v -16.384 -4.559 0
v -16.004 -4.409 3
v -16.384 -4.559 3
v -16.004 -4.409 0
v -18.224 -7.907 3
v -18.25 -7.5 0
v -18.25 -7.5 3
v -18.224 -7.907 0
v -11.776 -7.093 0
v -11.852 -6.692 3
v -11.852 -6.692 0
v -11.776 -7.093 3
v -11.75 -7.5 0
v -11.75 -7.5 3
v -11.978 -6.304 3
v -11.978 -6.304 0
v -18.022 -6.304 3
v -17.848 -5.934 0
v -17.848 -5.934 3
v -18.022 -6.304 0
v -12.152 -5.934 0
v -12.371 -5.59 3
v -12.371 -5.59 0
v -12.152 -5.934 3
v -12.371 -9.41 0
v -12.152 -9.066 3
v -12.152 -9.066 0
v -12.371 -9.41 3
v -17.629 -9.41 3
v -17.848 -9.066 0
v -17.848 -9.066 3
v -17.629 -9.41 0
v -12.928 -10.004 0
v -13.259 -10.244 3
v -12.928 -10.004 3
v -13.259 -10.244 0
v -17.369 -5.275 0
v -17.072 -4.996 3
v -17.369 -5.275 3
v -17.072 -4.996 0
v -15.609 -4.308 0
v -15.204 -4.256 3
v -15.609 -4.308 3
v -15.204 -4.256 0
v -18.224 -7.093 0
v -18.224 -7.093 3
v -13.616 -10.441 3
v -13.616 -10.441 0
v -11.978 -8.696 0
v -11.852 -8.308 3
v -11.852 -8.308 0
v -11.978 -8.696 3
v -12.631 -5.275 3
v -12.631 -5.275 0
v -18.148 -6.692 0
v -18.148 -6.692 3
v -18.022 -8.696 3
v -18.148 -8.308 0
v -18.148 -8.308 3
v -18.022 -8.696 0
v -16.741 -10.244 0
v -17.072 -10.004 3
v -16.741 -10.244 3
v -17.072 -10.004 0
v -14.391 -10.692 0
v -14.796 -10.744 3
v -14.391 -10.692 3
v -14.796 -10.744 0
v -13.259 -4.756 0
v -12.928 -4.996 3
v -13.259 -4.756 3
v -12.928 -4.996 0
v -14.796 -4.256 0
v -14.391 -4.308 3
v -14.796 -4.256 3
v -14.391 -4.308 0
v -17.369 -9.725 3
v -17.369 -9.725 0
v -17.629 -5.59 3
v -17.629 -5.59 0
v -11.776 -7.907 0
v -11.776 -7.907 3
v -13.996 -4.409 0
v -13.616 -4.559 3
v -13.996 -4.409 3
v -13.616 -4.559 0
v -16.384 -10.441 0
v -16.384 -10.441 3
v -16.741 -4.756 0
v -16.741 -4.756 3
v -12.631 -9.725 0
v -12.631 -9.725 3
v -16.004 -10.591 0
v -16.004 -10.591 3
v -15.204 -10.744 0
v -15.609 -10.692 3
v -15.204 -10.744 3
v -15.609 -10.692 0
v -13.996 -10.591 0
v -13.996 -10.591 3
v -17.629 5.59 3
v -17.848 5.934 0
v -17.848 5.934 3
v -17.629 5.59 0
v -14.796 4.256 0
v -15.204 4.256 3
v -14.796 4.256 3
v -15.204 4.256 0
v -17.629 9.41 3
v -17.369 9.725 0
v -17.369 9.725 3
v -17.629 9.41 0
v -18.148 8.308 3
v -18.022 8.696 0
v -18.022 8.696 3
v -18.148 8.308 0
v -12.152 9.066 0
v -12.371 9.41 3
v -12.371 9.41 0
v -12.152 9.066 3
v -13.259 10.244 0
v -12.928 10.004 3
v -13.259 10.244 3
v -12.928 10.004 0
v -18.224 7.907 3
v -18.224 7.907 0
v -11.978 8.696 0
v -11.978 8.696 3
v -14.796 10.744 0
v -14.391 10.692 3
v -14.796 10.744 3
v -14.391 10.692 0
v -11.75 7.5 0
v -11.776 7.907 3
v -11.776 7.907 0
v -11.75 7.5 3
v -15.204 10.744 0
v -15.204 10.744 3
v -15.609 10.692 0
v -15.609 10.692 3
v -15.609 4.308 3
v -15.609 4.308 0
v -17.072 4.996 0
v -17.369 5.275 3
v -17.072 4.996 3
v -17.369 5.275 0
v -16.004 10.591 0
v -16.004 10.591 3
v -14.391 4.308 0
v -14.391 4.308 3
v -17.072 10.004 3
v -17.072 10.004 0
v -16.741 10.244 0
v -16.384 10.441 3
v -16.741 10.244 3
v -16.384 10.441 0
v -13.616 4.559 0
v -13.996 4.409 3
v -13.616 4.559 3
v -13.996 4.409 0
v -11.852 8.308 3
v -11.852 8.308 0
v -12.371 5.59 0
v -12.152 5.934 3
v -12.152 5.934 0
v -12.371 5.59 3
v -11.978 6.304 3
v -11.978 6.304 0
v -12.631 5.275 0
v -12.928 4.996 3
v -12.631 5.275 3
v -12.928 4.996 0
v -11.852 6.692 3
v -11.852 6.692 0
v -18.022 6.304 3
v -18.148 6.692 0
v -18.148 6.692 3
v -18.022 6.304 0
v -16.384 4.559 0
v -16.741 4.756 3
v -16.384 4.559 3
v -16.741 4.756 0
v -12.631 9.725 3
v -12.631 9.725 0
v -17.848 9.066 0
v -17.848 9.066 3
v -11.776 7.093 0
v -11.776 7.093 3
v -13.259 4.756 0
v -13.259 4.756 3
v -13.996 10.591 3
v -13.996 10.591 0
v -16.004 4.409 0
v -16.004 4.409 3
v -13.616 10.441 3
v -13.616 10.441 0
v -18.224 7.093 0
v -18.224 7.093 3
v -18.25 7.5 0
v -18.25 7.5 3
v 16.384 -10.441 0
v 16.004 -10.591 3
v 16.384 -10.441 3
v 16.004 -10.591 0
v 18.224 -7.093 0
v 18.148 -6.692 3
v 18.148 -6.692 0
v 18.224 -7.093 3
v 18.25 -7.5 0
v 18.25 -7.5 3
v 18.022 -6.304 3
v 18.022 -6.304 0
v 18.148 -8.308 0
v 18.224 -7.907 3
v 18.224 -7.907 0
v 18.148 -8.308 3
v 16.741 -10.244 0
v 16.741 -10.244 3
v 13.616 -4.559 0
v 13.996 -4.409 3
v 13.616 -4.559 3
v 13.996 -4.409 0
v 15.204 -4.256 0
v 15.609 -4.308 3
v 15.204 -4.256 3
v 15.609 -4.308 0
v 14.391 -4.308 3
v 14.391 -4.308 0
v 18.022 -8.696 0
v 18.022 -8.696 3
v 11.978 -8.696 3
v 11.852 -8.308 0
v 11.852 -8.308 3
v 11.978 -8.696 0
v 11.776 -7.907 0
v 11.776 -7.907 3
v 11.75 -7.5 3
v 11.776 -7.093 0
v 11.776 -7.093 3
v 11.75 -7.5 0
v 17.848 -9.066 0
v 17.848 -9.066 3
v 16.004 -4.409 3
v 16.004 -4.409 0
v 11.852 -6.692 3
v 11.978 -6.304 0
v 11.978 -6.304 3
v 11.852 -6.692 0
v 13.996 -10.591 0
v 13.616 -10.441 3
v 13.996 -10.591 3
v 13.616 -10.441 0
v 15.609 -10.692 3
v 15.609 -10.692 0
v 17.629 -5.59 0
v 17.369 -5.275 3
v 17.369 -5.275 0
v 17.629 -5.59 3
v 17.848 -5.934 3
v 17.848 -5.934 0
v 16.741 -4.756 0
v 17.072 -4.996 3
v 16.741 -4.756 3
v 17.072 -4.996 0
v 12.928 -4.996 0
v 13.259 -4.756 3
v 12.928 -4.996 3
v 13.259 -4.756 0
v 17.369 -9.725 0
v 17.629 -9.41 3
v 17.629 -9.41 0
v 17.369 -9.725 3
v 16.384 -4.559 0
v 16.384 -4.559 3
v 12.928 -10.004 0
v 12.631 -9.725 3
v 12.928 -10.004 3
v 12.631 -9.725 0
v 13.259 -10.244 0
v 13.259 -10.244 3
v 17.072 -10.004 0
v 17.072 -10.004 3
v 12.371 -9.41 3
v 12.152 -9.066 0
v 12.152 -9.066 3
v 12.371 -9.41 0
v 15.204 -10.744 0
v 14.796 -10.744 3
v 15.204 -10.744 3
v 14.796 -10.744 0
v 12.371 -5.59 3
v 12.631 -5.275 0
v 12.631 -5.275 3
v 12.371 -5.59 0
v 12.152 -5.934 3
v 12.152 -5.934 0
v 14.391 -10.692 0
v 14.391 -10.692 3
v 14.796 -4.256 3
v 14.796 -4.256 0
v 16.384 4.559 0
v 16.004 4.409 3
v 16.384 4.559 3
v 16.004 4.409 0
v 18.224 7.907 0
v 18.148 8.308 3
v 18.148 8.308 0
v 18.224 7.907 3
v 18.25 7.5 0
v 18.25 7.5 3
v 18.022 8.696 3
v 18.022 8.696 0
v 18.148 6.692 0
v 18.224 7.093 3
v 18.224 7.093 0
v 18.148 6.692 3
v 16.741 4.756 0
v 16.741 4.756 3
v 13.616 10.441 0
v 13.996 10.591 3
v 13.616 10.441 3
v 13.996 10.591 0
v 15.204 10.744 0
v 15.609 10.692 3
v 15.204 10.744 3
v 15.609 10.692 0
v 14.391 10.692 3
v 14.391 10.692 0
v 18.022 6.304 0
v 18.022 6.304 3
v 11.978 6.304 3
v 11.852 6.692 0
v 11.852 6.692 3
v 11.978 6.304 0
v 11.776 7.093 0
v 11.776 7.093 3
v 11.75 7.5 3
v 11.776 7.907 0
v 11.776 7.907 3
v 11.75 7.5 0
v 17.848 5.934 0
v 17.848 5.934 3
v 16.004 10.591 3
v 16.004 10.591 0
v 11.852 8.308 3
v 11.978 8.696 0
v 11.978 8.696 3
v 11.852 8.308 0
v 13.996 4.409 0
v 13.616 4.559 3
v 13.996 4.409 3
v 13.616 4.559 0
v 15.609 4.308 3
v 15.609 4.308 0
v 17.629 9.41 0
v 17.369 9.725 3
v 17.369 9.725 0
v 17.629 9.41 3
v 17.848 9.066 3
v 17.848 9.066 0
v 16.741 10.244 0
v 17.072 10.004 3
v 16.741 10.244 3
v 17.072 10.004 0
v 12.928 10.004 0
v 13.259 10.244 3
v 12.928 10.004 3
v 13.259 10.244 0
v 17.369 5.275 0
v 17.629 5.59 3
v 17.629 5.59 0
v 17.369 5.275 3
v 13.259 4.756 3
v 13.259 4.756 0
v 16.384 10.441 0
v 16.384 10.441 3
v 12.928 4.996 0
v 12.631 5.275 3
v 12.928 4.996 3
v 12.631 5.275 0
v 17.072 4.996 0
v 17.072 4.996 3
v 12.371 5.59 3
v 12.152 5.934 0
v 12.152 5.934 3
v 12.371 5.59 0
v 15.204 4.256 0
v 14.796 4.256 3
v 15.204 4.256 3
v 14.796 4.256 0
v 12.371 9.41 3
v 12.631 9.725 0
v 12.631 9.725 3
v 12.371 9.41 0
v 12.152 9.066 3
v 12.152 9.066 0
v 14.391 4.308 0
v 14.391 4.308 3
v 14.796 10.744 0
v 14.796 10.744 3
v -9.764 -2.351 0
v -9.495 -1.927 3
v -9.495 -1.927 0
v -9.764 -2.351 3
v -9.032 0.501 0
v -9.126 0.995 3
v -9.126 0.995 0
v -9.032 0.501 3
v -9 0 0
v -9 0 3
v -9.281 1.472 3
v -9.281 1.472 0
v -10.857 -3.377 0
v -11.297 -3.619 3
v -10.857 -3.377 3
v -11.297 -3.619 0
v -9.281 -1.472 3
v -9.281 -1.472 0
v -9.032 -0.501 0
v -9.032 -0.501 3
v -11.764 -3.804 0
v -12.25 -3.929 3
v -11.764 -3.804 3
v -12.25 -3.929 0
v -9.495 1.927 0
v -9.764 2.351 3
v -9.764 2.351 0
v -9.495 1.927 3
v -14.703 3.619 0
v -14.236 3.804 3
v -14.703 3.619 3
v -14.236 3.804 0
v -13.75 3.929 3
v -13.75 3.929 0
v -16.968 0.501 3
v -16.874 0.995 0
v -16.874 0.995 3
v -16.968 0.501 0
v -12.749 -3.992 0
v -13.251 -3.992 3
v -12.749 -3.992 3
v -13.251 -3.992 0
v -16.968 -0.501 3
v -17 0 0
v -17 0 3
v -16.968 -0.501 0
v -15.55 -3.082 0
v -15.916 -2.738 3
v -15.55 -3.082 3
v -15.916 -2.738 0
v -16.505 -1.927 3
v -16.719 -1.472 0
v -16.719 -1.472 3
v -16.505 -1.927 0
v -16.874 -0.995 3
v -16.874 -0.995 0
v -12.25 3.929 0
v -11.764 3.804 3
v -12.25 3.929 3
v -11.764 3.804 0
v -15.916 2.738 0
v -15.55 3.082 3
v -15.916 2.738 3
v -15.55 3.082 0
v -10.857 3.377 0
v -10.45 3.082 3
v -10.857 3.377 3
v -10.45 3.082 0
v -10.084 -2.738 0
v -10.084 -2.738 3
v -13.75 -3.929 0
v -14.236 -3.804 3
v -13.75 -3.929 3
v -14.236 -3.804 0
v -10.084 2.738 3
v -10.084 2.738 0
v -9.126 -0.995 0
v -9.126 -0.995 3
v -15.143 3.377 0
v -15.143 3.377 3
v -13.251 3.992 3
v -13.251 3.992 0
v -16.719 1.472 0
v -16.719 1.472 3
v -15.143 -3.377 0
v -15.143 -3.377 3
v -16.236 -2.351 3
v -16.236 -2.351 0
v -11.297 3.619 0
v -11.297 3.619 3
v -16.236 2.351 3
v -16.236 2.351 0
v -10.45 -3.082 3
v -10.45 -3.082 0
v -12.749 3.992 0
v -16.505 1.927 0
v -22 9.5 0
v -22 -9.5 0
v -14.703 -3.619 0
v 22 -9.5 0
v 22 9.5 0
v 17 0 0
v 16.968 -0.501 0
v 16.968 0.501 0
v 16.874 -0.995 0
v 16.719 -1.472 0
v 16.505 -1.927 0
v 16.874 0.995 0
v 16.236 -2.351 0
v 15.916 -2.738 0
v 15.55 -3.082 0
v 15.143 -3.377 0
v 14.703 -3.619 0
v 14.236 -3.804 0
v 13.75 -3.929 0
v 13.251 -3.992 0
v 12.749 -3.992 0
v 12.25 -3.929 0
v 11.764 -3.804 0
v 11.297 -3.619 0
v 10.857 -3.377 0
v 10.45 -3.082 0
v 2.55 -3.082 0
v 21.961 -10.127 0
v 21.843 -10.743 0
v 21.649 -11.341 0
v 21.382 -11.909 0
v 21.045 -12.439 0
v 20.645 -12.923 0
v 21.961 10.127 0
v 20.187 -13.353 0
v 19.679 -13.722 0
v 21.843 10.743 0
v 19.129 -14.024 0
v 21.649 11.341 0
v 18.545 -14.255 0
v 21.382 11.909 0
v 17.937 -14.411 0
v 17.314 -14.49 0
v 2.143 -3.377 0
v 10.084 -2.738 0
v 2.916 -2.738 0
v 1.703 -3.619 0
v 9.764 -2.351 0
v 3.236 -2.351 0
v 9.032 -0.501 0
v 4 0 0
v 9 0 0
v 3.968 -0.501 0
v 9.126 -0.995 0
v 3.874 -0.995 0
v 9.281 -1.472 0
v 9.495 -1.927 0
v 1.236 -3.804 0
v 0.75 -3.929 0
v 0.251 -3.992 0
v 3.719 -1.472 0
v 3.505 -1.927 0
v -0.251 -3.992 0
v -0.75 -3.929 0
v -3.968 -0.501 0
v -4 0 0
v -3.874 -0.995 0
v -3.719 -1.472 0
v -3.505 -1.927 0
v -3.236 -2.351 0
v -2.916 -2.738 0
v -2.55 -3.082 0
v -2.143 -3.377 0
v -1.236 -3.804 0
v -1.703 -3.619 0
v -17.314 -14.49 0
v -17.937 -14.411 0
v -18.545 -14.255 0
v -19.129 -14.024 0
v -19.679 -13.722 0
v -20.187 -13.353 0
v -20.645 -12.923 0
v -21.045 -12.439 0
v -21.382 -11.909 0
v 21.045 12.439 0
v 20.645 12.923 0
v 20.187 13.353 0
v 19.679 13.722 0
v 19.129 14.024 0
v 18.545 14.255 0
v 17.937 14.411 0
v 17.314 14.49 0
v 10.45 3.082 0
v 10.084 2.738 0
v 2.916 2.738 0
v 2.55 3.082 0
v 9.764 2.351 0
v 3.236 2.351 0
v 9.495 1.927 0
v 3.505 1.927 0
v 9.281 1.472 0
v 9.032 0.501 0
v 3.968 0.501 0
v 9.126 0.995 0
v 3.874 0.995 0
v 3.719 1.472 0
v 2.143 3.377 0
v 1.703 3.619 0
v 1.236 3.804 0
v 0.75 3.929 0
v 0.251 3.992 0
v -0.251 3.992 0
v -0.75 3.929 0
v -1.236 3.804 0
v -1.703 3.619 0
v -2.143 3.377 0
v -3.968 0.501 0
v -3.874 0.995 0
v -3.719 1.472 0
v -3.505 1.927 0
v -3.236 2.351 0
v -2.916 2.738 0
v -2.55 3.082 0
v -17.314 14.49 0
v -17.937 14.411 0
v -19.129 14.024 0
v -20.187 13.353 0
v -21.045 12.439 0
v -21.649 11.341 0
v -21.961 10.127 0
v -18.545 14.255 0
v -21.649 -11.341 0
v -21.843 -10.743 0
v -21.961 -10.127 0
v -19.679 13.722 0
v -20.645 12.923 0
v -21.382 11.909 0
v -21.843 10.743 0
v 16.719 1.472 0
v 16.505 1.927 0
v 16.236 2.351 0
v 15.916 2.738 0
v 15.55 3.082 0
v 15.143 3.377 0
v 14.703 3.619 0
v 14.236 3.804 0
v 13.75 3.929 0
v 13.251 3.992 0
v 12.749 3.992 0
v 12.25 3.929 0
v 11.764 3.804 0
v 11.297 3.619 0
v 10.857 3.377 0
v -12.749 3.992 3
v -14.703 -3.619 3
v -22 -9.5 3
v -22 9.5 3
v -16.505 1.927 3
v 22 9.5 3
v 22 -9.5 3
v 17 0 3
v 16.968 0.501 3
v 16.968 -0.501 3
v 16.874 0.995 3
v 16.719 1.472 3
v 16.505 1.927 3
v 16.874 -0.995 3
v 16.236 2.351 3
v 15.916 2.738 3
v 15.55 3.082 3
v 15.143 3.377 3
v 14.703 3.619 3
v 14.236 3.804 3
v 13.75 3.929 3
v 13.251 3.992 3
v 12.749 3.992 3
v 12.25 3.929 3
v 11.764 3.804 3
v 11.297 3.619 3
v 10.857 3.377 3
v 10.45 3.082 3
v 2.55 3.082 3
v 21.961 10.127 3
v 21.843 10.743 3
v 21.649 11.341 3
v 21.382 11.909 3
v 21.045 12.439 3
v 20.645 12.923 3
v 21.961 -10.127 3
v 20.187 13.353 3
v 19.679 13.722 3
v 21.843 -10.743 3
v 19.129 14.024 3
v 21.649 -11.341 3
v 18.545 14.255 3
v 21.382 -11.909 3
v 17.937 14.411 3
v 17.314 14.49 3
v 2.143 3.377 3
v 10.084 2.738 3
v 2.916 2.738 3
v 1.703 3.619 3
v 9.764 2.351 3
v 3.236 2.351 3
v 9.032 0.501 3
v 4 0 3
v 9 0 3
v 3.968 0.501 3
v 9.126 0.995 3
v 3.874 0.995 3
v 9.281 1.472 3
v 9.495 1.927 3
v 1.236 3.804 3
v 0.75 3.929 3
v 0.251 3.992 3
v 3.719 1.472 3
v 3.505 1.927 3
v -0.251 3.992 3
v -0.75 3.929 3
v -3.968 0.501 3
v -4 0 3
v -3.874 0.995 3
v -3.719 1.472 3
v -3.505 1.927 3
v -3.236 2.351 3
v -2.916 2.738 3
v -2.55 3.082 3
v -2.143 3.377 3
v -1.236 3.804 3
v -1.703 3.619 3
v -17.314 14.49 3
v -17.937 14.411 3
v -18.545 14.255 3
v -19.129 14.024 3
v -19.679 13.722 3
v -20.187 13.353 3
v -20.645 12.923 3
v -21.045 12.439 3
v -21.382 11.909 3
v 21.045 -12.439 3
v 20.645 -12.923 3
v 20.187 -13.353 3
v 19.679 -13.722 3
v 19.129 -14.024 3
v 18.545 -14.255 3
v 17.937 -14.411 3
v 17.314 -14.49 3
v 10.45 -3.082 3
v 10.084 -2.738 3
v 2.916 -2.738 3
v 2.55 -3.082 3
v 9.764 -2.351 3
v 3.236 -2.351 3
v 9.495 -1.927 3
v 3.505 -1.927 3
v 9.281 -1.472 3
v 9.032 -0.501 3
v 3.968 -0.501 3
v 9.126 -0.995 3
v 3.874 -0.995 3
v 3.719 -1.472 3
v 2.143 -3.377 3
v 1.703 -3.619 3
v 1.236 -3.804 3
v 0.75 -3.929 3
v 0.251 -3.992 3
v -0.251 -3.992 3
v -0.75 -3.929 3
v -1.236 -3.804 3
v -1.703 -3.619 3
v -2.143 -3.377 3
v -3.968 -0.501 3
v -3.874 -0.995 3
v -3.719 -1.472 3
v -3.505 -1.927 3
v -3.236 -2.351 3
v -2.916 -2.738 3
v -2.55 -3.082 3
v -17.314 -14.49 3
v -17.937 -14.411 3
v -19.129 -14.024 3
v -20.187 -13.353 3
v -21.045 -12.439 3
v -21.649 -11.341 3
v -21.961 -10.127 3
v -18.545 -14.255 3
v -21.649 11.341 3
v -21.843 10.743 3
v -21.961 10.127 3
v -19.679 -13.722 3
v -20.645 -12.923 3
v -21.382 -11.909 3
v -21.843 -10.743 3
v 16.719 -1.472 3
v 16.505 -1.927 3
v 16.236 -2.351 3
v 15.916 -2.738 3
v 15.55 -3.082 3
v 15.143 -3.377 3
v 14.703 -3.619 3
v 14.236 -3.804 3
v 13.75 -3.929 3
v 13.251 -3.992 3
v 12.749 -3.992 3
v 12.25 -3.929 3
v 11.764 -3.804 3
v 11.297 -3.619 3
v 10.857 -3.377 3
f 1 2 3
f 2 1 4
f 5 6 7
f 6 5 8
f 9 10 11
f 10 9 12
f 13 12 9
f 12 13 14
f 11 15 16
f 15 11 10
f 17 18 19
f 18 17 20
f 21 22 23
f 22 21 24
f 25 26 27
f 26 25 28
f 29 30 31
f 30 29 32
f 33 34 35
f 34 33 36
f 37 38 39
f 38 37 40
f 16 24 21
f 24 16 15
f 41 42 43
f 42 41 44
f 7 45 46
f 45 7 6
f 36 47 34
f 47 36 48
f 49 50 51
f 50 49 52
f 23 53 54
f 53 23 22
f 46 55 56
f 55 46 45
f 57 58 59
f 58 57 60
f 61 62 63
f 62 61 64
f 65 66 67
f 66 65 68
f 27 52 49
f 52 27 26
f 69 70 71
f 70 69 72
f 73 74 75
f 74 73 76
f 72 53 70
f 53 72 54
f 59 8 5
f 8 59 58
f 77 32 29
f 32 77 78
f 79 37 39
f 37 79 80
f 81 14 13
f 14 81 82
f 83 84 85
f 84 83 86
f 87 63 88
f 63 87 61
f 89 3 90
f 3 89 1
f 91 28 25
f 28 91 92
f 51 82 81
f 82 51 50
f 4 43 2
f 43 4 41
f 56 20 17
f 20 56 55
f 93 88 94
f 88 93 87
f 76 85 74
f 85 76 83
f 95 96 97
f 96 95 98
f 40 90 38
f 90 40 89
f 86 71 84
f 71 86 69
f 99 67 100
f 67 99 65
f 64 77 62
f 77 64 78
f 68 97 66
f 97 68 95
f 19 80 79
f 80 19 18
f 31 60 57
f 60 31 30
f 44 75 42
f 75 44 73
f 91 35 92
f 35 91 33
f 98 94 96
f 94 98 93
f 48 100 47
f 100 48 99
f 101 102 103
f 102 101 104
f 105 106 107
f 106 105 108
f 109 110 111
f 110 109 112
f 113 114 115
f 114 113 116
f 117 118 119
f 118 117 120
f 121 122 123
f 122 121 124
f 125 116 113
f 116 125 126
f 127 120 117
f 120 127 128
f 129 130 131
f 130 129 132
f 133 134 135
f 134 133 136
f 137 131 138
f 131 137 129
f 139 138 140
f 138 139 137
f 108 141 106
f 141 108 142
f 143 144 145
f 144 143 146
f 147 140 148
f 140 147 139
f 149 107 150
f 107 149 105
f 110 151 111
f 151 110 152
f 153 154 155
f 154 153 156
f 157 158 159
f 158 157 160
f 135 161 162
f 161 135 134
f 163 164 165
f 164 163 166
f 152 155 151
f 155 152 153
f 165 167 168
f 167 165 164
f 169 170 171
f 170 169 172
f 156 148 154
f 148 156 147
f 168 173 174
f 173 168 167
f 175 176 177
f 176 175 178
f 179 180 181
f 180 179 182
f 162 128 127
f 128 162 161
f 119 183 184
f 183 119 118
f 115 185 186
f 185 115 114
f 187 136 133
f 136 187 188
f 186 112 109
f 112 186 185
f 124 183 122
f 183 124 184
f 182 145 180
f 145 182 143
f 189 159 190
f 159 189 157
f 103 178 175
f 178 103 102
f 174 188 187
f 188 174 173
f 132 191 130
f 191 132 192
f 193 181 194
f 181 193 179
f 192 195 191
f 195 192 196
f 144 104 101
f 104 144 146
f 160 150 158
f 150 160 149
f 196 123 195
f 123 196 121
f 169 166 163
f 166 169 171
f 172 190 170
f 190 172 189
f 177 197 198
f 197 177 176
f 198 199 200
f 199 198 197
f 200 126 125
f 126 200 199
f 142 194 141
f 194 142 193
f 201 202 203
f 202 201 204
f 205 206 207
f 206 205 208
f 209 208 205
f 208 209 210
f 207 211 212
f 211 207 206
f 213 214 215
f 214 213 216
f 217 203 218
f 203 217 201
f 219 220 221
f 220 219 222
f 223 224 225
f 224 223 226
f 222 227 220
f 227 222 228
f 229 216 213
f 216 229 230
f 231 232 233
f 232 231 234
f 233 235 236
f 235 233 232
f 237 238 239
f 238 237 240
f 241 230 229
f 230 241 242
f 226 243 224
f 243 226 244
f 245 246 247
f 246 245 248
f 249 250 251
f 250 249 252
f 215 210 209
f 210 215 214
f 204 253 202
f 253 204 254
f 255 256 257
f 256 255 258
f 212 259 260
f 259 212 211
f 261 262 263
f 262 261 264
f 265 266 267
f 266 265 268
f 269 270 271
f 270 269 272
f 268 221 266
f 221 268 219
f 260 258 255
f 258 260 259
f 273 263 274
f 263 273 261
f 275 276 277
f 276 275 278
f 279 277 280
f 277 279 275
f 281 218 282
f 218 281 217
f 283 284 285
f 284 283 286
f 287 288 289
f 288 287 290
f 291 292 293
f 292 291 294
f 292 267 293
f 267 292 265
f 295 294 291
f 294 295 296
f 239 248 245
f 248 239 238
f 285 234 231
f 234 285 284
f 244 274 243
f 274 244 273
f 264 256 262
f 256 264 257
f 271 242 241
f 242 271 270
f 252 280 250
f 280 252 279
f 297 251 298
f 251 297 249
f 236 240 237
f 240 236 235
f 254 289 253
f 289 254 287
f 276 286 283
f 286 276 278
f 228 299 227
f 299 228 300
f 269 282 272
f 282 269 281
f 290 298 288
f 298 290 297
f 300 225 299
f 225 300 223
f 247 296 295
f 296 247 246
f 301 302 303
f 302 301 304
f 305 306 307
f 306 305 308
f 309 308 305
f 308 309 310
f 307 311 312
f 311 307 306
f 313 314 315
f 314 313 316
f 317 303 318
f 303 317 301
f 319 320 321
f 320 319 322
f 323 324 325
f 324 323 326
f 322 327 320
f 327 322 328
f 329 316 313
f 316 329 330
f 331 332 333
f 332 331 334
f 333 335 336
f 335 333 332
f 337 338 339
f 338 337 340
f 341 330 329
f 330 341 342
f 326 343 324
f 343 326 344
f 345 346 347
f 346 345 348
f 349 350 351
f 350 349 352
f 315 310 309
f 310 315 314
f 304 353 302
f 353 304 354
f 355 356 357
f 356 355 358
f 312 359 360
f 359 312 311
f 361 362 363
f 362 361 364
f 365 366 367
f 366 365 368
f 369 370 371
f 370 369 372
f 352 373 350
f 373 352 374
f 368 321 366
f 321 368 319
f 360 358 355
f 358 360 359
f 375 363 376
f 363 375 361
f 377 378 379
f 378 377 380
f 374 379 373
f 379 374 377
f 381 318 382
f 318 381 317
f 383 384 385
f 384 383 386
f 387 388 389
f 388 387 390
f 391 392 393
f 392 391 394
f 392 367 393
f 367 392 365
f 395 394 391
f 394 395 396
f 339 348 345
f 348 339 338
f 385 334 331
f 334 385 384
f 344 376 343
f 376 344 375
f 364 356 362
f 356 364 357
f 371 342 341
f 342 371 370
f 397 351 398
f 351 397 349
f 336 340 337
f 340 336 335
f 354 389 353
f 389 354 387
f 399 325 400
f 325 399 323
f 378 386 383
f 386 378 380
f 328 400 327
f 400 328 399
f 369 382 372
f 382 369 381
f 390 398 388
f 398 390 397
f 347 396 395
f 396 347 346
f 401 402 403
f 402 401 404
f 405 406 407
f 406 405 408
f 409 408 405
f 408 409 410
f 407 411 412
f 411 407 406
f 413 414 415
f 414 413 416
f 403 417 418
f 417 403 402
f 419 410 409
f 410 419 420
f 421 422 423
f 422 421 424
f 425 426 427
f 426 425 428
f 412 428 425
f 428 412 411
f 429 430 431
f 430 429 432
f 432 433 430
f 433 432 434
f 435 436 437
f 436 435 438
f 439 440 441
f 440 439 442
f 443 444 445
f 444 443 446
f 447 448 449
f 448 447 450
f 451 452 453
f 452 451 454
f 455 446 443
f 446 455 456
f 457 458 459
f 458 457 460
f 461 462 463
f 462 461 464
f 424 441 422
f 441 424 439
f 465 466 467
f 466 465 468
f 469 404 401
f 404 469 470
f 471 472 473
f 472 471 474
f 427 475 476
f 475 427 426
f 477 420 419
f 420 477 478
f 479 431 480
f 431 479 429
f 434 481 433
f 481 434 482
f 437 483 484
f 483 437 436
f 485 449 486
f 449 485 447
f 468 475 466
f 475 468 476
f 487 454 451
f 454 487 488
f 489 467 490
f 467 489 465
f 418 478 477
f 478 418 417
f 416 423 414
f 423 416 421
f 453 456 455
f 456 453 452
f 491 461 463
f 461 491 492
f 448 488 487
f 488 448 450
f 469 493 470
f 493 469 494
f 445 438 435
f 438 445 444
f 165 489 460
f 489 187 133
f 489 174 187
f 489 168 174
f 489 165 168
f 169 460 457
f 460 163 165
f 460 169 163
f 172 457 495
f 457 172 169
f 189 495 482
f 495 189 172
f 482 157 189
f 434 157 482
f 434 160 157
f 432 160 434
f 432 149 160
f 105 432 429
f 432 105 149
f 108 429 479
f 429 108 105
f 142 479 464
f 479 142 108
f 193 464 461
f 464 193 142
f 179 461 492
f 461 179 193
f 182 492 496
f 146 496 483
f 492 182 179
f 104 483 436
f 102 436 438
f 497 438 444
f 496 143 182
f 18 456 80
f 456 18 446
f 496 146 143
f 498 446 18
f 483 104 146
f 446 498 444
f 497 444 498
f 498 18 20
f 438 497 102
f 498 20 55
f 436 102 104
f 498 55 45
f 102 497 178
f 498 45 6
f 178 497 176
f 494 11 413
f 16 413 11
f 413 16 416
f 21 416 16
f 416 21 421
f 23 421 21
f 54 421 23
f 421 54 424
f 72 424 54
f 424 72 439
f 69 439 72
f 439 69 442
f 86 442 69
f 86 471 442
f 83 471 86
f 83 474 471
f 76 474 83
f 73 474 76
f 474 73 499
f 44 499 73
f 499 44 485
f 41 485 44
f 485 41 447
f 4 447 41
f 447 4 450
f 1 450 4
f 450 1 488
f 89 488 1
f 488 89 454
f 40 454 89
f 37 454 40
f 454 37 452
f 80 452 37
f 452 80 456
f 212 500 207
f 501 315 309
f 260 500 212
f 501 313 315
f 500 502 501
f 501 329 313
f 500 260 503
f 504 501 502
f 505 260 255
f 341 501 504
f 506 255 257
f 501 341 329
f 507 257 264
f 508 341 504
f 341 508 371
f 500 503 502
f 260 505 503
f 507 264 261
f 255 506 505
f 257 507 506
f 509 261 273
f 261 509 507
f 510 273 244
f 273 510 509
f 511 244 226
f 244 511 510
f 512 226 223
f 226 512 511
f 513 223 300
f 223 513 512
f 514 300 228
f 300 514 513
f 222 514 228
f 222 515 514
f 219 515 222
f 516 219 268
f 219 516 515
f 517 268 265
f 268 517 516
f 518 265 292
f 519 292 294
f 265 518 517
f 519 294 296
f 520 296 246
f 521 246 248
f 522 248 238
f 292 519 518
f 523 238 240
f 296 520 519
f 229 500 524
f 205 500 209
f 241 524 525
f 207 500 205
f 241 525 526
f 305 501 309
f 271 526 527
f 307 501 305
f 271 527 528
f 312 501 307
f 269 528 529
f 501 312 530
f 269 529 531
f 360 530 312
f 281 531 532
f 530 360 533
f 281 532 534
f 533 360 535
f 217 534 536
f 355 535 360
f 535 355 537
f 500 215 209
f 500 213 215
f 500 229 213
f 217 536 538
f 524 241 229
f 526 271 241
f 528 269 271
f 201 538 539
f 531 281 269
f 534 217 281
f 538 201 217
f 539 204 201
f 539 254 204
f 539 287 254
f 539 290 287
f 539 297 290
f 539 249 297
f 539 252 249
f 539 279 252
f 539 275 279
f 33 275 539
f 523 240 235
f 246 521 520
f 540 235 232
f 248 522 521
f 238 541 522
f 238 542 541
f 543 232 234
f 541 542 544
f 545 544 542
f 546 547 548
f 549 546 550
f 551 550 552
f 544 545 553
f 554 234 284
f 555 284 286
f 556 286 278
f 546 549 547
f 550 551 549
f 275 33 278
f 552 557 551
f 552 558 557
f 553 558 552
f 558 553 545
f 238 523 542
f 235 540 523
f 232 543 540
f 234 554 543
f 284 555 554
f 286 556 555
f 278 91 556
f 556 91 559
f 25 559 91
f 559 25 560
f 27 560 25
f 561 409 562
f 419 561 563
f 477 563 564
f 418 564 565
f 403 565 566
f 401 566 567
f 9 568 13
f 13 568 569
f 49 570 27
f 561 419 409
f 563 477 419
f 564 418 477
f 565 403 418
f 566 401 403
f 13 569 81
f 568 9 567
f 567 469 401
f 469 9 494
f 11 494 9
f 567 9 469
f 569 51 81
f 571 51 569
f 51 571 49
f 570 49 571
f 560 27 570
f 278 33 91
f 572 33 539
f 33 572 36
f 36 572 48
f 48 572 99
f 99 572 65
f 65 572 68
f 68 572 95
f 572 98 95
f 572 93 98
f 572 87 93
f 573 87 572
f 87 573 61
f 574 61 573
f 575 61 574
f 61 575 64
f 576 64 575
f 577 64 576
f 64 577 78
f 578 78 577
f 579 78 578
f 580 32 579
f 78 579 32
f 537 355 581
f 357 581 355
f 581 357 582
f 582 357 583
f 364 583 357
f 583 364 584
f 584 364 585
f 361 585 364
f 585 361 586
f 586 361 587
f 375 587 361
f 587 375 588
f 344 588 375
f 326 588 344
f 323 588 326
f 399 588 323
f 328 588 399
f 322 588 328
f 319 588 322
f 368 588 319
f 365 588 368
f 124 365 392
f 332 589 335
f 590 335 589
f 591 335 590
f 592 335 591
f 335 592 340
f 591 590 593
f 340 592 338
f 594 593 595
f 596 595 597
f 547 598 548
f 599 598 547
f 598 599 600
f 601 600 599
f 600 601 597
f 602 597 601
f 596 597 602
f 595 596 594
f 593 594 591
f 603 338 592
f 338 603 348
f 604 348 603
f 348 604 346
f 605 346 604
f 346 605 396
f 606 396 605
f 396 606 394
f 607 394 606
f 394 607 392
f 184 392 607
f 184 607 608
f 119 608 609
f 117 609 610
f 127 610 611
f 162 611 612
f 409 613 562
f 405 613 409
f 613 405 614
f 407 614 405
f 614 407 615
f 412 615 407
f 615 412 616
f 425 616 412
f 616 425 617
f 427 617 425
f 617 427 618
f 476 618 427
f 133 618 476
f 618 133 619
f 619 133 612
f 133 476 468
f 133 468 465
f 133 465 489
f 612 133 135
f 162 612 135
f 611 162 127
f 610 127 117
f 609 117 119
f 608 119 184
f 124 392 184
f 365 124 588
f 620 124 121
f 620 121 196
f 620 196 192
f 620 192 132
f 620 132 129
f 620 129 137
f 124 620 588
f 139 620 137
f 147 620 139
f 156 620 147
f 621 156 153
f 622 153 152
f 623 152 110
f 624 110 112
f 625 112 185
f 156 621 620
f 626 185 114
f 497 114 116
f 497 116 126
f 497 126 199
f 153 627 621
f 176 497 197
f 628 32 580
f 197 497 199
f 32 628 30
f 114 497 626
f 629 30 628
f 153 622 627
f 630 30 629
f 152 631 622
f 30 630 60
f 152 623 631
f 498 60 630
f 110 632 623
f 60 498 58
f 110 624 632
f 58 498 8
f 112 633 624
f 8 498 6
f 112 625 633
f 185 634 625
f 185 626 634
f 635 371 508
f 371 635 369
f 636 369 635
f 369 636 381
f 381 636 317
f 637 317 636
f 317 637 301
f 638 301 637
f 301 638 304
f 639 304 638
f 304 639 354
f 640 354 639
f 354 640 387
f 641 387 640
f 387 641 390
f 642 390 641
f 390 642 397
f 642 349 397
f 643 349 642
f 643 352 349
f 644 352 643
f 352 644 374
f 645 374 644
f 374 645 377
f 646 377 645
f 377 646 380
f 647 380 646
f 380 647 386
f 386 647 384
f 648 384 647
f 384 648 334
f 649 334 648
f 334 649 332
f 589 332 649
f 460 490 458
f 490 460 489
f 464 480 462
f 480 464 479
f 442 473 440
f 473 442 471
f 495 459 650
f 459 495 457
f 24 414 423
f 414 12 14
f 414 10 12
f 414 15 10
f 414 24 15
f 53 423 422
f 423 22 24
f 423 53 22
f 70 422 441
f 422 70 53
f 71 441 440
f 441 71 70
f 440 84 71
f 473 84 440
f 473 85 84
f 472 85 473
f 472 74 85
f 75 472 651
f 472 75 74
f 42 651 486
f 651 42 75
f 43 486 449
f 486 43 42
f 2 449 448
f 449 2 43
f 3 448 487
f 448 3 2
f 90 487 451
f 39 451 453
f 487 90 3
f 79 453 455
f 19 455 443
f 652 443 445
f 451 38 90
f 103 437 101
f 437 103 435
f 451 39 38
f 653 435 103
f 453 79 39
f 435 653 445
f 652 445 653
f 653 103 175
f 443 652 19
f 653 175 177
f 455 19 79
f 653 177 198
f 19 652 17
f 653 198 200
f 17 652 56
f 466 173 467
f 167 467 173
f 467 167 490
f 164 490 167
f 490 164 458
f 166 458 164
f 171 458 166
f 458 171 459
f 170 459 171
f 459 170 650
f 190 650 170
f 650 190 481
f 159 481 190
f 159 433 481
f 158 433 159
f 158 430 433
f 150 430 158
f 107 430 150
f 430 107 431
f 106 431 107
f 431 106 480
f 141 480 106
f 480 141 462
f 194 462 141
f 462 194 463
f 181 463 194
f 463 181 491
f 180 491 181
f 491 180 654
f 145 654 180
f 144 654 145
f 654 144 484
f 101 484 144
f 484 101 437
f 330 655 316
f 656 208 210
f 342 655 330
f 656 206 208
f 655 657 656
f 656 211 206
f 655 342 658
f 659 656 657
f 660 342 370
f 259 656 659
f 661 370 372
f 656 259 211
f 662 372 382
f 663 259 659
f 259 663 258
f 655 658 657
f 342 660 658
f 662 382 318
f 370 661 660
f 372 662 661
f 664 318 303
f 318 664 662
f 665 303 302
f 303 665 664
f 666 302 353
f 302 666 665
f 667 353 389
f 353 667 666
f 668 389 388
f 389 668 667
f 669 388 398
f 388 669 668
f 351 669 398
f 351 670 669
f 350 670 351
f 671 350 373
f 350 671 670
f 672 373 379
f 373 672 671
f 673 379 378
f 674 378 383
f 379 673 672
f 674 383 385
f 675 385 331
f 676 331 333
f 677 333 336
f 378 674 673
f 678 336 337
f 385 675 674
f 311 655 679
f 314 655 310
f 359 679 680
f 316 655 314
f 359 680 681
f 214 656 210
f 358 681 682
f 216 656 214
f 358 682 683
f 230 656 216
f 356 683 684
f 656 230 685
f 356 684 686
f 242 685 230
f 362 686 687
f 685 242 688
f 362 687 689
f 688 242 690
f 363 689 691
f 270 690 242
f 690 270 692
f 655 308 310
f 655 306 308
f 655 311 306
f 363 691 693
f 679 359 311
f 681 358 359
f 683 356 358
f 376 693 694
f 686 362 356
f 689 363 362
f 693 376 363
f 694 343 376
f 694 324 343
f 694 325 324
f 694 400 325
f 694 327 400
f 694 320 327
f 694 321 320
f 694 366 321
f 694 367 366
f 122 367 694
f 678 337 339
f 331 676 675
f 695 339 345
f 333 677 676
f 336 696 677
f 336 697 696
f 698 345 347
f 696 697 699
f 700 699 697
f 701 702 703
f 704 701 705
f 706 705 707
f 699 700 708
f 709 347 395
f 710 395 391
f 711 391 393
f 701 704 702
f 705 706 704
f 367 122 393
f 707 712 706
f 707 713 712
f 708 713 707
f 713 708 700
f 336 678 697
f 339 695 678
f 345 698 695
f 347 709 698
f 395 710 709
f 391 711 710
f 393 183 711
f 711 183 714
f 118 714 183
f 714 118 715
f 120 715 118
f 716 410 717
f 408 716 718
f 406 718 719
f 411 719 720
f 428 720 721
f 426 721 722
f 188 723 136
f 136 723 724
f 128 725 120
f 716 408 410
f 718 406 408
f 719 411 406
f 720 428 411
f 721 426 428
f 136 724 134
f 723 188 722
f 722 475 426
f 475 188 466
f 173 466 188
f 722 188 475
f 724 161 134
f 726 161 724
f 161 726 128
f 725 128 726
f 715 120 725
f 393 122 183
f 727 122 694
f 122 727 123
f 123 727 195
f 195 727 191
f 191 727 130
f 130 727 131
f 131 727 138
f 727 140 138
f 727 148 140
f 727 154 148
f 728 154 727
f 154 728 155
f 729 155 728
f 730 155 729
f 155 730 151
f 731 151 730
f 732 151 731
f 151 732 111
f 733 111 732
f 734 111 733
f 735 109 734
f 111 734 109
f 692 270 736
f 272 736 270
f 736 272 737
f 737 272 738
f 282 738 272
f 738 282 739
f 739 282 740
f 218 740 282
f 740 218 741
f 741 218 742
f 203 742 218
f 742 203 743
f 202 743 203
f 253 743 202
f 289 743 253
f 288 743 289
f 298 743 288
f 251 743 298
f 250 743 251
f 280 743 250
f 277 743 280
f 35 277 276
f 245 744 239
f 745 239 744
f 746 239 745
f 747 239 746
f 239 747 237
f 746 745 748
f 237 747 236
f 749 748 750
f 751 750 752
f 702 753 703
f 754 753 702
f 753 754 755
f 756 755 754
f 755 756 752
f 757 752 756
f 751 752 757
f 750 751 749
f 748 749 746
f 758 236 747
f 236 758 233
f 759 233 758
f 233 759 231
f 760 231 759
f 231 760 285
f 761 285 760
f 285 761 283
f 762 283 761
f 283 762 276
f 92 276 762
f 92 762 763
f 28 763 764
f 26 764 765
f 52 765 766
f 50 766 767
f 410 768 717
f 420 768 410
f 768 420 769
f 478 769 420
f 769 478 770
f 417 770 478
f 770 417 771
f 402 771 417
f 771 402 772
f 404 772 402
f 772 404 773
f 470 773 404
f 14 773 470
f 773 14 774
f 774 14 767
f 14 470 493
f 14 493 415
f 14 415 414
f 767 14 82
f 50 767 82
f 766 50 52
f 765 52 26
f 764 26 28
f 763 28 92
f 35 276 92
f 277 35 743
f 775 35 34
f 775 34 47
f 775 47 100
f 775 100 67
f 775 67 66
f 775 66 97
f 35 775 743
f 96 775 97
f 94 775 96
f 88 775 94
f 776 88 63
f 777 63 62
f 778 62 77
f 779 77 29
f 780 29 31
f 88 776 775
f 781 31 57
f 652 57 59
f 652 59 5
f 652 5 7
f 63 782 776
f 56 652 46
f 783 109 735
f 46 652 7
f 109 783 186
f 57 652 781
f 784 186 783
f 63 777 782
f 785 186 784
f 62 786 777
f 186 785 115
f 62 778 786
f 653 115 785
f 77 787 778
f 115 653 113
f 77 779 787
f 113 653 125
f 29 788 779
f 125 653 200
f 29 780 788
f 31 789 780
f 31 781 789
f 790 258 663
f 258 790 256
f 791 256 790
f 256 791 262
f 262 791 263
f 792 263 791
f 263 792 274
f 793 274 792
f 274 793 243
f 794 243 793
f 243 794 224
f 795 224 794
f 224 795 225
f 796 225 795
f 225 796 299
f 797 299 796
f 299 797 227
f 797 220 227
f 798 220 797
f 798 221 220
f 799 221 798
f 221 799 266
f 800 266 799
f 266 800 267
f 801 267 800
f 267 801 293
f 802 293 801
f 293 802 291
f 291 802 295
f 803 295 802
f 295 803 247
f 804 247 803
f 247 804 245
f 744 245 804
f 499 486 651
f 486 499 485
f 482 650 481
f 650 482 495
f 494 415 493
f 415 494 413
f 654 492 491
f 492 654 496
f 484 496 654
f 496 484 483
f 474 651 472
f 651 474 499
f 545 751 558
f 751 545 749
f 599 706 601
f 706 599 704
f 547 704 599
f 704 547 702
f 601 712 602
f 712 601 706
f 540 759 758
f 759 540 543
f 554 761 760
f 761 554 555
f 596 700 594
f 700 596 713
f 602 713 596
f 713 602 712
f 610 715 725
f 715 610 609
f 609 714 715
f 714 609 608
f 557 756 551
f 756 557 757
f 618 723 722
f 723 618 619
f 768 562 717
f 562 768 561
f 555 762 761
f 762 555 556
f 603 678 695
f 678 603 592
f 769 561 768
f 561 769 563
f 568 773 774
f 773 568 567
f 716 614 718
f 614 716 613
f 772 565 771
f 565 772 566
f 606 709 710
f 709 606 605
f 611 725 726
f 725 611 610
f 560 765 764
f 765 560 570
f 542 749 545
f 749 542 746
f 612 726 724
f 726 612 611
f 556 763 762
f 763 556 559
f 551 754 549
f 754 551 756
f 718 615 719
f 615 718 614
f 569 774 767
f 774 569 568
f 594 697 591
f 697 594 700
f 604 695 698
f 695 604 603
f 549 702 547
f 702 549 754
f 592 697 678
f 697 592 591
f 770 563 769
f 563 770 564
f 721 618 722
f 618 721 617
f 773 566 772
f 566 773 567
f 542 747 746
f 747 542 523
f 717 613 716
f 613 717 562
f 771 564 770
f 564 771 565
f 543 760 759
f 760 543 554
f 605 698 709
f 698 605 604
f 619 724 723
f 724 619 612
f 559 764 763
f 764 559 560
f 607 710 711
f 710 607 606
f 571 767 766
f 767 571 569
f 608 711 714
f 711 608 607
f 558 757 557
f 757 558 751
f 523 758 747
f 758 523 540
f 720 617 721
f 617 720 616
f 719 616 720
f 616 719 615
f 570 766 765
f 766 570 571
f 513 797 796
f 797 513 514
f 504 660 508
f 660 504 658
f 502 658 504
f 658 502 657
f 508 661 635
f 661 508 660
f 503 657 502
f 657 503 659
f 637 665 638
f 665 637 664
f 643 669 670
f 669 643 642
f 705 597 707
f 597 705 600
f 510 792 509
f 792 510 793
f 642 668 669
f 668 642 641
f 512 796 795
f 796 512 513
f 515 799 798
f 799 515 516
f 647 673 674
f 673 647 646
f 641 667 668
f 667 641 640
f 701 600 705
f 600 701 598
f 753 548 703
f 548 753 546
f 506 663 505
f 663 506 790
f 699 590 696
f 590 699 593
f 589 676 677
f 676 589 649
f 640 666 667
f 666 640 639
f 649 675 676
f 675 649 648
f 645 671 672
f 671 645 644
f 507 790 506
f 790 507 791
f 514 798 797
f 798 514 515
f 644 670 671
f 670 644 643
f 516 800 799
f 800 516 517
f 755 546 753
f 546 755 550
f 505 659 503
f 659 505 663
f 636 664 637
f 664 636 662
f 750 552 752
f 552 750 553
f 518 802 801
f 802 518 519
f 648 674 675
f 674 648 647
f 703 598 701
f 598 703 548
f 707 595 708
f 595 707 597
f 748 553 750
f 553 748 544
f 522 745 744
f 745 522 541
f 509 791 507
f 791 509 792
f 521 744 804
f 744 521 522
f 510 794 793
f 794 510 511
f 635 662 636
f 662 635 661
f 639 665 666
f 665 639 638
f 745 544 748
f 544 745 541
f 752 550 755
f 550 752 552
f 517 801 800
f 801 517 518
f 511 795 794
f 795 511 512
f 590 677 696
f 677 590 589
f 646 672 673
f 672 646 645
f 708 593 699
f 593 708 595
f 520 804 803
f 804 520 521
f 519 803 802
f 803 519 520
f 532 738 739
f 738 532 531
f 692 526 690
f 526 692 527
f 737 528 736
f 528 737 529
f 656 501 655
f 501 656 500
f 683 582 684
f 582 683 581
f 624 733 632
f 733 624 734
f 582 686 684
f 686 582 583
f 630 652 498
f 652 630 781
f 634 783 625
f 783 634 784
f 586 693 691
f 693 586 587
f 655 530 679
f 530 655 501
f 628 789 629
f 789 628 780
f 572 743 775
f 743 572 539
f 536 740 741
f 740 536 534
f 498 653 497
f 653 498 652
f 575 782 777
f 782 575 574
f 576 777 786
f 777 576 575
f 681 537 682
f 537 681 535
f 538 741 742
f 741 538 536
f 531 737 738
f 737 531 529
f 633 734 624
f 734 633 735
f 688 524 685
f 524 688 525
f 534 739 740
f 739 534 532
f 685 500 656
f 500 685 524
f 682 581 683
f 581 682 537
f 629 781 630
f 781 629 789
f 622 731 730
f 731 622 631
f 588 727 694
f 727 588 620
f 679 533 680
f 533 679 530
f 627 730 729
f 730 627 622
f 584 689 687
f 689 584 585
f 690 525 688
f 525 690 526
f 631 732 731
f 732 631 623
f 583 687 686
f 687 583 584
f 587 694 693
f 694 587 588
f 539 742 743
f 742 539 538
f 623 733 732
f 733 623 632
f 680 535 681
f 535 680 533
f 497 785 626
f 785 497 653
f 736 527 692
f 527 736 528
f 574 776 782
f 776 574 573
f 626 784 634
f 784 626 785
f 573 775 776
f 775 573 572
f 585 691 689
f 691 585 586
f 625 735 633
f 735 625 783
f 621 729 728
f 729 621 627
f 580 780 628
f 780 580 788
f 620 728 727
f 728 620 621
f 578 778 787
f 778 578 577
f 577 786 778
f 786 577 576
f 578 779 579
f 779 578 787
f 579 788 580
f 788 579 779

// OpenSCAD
$fn = 50;


difference() {
	union() {
		hull() {
			translate(v = [-17.0000000000, 9.5000000000, 0]) {
				cylinder(h = 3, r = 5);
			}
			translate(v = [17.0000000000, 9.5000000000, 0]) {
				cylinder(h = 3, r = 5);
			}
			translate(v = [-17.0000000000, -9.5000000000, 0]) {
				cylinder(h = 3, r = 5);
			}
			translate(v = [17.0000000000, -9.5000000000, 0]) {
				cylinder(h = 3, r = 5);
			}
		}
	}
	union() {
		#translate(v = [-15.0000000000, -7.5000000000, -100.0000000000]) {
			cylinder(h = 200, r = 3.2500000000);
		}
		#translate(v = [-15.0000000000, 7.5000000000, -100.0000000000]) {
			cylinder(h = 200, r = 3.2500000000);
		}
		#translate(v = [15.0000000000, -7.5000000000, -100.0000000000]) {
			cylinder(h = 200, r = 3.2500000000);
		}
		#translate(v = [15.0000000000, 7.5000000000, -100.0000000000]) {
			cylinder(h = 200, r = 3.2500000000);
		}
		#translate(v = [-13.0000000000, 0, 0]) {
			cylinder(h = 3, r = 4.0000000000);
		}
		#cylinder(h = 3, r = 4.0000000000);
		#translate(v = [13.0000000000, 0, 0]) {
			cylinder(h = 3, r = 4.0000000000);
		}
	}
}
